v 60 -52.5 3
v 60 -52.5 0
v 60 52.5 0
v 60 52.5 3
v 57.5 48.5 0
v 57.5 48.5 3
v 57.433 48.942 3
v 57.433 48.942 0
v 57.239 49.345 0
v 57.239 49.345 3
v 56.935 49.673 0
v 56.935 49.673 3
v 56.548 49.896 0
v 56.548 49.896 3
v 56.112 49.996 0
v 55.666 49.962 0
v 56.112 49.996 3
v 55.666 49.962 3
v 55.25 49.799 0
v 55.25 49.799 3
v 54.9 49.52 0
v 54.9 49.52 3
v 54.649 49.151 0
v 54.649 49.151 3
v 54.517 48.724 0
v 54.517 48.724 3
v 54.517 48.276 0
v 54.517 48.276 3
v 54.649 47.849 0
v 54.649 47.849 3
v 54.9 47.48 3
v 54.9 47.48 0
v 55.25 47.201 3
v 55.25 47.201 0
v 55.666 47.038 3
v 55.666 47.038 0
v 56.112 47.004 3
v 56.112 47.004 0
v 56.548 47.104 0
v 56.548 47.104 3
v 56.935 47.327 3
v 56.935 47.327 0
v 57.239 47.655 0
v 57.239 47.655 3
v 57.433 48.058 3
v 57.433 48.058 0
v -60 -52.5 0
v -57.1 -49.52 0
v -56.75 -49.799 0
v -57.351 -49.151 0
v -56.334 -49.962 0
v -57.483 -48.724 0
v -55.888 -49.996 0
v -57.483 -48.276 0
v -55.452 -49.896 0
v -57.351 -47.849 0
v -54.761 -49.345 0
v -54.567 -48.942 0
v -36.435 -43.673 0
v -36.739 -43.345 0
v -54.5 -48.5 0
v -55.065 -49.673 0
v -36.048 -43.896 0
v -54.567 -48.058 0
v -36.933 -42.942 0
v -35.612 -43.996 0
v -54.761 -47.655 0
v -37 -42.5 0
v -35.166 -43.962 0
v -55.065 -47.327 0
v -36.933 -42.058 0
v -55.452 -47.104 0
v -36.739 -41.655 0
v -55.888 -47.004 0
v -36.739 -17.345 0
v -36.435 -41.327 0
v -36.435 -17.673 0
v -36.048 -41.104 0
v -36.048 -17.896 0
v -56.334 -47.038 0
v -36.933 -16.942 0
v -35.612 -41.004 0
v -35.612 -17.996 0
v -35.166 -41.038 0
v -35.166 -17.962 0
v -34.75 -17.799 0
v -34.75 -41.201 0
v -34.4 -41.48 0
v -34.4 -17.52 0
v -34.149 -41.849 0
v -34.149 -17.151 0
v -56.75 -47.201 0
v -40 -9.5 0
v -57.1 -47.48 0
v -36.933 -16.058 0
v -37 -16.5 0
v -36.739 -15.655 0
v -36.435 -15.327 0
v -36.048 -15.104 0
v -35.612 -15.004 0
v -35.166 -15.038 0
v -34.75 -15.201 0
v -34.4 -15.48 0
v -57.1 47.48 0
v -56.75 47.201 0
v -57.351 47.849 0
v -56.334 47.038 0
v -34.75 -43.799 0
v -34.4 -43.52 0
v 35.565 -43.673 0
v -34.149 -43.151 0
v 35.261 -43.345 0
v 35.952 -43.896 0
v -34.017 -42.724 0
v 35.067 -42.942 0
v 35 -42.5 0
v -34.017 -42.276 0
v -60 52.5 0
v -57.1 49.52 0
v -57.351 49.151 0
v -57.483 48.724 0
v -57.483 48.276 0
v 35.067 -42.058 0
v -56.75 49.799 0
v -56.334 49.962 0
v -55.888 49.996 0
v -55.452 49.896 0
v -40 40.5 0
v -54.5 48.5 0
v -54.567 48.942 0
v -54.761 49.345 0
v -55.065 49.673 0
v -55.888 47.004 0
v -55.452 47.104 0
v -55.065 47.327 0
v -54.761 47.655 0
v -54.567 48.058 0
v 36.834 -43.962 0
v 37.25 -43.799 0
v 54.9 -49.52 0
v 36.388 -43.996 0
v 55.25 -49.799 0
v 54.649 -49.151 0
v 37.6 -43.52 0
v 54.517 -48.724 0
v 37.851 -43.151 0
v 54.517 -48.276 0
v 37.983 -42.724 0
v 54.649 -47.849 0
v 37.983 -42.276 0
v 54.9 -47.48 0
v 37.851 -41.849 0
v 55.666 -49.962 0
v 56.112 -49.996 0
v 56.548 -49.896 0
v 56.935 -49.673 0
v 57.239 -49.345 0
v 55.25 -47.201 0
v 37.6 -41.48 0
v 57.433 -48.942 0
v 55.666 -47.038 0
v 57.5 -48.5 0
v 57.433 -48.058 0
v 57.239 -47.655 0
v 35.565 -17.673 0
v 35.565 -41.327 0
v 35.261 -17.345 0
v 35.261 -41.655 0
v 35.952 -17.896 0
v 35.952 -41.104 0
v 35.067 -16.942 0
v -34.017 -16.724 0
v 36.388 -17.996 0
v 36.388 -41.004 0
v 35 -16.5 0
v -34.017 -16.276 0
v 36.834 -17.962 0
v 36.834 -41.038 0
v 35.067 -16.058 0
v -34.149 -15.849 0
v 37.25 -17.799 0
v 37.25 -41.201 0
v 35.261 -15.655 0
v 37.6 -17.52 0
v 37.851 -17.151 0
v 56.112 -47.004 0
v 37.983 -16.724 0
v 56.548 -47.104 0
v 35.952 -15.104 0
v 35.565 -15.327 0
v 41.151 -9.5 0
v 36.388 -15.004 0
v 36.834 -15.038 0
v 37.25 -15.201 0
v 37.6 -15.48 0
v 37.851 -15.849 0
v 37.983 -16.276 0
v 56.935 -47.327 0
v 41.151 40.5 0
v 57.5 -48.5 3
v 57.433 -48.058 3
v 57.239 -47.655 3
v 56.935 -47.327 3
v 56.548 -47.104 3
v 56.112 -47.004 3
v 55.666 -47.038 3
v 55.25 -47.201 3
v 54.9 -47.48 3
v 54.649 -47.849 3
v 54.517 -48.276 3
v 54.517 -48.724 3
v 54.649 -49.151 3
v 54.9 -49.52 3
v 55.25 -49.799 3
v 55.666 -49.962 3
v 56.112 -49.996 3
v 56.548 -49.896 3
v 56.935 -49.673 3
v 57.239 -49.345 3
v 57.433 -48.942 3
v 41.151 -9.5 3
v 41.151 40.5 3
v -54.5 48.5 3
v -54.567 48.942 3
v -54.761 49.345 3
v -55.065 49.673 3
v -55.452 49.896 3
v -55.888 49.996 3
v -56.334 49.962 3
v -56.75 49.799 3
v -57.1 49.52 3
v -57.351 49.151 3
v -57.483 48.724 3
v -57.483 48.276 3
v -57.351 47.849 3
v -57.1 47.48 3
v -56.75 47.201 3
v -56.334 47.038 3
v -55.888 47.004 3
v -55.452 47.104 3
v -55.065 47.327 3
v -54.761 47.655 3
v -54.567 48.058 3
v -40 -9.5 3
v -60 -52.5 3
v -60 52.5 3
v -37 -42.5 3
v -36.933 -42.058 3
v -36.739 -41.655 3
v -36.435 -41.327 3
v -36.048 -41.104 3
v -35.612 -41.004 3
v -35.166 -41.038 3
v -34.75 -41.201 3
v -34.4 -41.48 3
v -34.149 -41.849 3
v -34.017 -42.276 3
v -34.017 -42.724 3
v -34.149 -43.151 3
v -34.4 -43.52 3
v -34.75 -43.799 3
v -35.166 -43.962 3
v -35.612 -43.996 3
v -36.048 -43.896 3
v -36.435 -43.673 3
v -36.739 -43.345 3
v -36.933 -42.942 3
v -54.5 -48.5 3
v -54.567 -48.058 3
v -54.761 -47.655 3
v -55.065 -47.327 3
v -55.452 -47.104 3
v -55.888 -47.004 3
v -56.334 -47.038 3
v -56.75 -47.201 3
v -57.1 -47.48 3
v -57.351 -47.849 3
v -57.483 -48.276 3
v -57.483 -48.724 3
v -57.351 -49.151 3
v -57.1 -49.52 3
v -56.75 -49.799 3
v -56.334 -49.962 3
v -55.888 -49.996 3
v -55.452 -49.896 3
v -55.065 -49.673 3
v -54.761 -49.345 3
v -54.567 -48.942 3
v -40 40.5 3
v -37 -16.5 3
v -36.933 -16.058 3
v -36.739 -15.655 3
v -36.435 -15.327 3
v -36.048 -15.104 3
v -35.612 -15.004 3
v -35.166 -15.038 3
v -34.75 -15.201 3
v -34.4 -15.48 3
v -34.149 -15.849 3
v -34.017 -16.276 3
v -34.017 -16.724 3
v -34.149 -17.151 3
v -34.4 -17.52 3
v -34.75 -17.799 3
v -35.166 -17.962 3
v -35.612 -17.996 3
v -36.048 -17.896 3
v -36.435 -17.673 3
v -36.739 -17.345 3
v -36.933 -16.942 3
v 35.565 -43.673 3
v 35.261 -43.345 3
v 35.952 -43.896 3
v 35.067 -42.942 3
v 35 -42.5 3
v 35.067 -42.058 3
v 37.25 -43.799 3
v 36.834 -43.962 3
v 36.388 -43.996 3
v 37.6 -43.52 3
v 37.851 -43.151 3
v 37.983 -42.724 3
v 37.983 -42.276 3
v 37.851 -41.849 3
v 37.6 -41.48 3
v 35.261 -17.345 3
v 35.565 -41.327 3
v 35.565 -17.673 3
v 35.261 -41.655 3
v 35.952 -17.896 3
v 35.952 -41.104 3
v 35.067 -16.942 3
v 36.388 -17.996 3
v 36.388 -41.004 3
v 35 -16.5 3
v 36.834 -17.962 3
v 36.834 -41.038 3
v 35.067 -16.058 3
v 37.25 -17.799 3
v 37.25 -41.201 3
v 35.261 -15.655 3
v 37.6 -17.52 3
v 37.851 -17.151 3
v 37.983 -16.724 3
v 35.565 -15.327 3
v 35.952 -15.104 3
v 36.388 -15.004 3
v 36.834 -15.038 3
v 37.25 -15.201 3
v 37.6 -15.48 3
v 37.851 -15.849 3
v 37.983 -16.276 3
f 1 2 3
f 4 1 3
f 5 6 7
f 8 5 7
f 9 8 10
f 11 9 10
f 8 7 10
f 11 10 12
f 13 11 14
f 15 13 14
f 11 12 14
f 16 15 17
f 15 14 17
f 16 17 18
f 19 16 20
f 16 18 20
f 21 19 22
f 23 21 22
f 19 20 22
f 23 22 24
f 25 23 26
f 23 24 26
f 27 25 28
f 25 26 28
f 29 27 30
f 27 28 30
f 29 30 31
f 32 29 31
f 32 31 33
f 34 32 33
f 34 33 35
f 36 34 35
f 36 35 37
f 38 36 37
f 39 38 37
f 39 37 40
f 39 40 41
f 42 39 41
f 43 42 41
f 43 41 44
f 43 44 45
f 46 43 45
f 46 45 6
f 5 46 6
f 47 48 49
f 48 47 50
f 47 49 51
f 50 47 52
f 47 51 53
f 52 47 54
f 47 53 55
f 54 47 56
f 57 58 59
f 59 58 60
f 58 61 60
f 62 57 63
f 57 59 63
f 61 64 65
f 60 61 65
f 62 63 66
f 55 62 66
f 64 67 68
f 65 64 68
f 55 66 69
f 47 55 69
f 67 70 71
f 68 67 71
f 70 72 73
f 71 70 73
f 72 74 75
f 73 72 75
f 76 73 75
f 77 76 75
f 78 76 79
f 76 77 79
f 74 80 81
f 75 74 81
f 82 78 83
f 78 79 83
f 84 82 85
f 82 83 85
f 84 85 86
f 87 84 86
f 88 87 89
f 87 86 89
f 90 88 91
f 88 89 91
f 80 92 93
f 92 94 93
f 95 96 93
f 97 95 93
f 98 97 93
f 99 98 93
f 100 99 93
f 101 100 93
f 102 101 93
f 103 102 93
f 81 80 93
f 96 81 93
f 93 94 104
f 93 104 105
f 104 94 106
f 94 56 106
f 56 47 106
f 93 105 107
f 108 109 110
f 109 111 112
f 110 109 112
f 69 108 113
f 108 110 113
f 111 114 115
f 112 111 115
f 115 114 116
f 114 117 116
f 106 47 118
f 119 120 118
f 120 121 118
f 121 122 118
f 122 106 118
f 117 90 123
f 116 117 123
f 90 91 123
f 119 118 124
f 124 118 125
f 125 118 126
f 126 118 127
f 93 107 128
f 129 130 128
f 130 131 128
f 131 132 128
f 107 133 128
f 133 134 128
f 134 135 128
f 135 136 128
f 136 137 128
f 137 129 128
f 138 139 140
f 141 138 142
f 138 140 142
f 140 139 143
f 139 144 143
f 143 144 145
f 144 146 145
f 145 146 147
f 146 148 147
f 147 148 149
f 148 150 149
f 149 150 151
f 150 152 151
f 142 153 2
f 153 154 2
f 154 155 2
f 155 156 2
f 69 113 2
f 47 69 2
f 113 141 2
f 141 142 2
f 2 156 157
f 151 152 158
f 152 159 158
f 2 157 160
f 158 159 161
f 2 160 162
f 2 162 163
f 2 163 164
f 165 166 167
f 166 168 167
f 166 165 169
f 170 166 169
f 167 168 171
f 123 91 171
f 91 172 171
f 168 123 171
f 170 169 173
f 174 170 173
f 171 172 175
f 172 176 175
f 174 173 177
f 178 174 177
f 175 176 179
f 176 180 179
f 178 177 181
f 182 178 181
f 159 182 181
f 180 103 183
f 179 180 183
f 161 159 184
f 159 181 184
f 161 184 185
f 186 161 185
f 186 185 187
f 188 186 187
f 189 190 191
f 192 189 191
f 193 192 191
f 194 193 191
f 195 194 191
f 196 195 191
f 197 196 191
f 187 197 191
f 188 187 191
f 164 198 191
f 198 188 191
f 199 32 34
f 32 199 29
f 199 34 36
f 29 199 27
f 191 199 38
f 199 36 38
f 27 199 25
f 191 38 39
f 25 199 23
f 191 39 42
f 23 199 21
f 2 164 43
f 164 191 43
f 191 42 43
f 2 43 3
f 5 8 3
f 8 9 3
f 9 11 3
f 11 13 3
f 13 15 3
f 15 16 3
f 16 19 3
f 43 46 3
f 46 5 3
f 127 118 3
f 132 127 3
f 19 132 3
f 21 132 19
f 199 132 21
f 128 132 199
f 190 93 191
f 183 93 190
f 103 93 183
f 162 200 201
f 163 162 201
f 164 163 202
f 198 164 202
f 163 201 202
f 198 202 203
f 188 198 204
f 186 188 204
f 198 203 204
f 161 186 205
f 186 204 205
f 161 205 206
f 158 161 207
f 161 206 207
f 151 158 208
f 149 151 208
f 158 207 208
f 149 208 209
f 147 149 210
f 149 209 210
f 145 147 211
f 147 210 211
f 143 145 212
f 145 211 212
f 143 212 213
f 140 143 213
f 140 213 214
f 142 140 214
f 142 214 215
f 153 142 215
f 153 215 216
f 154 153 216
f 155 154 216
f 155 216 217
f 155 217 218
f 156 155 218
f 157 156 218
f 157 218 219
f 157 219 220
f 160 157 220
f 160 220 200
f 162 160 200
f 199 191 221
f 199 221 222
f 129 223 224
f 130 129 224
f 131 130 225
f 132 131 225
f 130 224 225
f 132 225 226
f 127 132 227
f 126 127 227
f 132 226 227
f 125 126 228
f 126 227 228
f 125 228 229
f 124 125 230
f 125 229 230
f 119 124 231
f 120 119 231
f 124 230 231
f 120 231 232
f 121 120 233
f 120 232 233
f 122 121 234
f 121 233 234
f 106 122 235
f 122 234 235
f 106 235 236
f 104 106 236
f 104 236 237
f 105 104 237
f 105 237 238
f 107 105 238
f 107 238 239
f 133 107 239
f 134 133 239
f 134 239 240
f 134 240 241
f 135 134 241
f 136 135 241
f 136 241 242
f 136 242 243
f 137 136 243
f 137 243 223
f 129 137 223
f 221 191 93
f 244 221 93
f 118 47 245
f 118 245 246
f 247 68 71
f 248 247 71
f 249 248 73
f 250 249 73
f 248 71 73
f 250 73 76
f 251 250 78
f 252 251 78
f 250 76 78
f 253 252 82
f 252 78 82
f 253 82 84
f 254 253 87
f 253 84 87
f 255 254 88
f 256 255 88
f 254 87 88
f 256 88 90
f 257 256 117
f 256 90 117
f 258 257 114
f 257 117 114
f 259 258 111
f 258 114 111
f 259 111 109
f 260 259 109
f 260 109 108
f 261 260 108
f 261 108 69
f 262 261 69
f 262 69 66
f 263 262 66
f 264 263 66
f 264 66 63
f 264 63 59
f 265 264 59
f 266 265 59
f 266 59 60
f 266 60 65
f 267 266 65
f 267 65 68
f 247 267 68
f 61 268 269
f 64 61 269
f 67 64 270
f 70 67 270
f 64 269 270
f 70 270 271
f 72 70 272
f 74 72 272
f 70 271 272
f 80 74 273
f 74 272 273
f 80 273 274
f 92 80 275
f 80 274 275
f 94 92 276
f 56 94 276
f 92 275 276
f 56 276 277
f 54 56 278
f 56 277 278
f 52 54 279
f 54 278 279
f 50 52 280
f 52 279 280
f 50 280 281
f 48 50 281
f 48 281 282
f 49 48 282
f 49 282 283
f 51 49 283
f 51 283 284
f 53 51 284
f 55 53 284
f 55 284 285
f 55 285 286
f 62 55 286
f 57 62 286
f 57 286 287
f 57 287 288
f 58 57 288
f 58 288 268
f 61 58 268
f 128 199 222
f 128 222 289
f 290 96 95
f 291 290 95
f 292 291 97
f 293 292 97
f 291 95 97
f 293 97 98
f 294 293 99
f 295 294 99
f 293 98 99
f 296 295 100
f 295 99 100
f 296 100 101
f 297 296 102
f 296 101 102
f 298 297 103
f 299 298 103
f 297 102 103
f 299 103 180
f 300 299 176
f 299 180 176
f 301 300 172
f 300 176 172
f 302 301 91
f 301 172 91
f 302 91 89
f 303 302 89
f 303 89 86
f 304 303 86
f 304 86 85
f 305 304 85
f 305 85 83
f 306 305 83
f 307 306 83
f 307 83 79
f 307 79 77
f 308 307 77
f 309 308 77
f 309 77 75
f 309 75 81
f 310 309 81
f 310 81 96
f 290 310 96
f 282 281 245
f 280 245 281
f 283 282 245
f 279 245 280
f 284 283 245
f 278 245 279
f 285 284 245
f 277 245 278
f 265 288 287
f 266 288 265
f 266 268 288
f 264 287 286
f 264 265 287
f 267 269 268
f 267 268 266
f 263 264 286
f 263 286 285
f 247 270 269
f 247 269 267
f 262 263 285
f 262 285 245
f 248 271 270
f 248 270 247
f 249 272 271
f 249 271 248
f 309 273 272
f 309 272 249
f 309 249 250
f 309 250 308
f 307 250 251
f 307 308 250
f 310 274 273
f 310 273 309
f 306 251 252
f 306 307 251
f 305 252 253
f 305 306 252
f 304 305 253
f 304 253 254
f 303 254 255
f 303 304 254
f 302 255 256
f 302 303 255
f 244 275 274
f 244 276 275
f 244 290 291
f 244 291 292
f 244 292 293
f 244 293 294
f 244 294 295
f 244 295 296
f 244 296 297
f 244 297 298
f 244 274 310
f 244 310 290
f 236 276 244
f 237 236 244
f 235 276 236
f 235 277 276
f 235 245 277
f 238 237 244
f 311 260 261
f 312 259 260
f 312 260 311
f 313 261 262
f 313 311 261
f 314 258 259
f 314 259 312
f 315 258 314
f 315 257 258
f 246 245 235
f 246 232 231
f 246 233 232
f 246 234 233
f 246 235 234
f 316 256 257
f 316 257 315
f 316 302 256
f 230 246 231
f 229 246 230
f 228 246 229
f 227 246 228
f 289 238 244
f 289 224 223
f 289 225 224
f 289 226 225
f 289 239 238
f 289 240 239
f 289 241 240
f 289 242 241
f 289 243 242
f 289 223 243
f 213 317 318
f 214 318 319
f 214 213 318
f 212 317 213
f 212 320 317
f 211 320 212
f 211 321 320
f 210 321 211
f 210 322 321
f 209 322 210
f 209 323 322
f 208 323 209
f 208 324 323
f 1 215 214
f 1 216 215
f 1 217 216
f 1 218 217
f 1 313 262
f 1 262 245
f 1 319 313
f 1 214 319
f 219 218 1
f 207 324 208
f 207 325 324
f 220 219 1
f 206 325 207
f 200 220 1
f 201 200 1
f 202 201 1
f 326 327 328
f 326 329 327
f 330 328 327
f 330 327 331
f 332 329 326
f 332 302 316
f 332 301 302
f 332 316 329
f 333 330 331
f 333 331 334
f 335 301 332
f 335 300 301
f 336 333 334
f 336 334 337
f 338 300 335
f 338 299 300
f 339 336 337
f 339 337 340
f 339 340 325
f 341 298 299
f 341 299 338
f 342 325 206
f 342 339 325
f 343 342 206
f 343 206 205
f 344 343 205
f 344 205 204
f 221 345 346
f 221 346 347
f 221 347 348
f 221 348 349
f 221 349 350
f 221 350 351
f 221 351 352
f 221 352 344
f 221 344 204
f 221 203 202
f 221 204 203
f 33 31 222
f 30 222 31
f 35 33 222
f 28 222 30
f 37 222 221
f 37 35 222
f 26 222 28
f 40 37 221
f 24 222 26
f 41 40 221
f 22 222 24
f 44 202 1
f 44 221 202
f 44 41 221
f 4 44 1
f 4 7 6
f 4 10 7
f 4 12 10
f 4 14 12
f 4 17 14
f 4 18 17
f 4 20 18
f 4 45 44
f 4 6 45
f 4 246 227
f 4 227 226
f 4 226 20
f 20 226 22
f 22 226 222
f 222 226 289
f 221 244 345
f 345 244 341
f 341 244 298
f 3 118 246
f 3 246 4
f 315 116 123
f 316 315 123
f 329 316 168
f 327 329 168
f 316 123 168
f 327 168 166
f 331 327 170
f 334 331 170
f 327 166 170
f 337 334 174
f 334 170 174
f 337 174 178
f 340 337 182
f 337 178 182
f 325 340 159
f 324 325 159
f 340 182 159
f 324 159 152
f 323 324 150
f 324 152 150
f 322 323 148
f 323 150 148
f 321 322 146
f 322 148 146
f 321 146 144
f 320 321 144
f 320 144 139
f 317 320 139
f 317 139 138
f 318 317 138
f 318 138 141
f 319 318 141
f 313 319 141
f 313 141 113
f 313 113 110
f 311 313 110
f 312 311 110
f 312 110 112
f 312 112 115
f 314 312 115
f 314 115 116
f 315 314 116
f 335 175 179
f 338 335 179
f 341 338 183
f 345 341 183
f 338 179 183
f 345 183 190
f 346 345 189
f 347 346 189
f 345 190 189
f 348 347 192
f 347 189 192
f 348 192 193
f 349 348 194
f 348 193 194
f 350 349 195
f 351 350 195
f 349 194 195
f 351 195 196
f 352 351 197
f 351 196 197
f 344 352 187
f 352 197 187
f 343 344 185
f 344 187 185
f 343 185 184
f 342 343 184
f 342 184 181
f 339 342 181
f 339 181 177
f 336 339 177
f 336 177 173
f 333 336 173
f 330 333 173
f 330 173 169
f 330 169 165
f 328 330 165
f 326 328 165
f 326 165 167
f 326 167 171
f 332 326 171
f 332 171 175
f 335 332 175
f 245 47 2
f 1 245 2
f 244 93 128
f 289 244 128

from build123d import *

# Parameters (mm, degrees)
SKETCH_1_W          = 120
SKETCH_1_H          = 105
EXTRUDE_1_DEPTH     = 3
SKETCH_2_R          = 1.5
CUT_EXTRUDE_1_DEPTH = 10
SKETCH_3_R          = 1.5
SKETCH_3_W          = 81.151446905
SKETCH_3_H          = 50
CUT_EXTRUDE_2_DEPTH = 10


with BuildPart() as part:
    # 草图1 → 凸台-拉伸1 (new body)
    with BuildSketch(Plane.XY):
        Rectangle(SKETCH_1_W, SKETCH_1_H)
    extrude(amount=EXTRUDE_1_DEPTH)

    # 草图2 → 切除-拉伸1 (cut)
    with BuildSketch(Plane.XY.offset(3)):
        with Locations((-56, 48.5)):
            Circle(SKETCH_2_R)
        with Locations((56, 48.5)):
            Circle(SKETCH_2_R)
        with Locations((56, -48.5)):
            Circle(SKETCH_2_R)
        with Locations((-56, -48.5)):
            Circle(SKETCH_2_R)
    extrude(amount=-CUT_EXTRUDE_1_DEPTH, mode=Mode.SUBTRACT)

    # 草图3 → 切除-拉伸2 (cut)
    with BuildSketch(Plane(origin=(0, 0, 0), x_dir=(-1, 0, 0), z_dir=(0, 0, -1))):
        with Locations((-36.5, -42.5)):
            Circle(SKETCH_3_R)
        with Locations((35.5, -42.5)):
            Circle(SKETCH_3_R)
        with Locations((-36.5, -16.5)):
            Circle(SKETCH_3_R)
        with Locations((35.5, -16.5)):
            Circle(SKETCH_3_R)
        with Locations((-0.575723453, 15.5)):
            Rectangle(SKETCH_3_W, SKETCH_3_H)
    extrude(amount=-CUT_EXTRUDE_2_DEPTH, mode=Mode.SUBTRACT)


solid = part.part
